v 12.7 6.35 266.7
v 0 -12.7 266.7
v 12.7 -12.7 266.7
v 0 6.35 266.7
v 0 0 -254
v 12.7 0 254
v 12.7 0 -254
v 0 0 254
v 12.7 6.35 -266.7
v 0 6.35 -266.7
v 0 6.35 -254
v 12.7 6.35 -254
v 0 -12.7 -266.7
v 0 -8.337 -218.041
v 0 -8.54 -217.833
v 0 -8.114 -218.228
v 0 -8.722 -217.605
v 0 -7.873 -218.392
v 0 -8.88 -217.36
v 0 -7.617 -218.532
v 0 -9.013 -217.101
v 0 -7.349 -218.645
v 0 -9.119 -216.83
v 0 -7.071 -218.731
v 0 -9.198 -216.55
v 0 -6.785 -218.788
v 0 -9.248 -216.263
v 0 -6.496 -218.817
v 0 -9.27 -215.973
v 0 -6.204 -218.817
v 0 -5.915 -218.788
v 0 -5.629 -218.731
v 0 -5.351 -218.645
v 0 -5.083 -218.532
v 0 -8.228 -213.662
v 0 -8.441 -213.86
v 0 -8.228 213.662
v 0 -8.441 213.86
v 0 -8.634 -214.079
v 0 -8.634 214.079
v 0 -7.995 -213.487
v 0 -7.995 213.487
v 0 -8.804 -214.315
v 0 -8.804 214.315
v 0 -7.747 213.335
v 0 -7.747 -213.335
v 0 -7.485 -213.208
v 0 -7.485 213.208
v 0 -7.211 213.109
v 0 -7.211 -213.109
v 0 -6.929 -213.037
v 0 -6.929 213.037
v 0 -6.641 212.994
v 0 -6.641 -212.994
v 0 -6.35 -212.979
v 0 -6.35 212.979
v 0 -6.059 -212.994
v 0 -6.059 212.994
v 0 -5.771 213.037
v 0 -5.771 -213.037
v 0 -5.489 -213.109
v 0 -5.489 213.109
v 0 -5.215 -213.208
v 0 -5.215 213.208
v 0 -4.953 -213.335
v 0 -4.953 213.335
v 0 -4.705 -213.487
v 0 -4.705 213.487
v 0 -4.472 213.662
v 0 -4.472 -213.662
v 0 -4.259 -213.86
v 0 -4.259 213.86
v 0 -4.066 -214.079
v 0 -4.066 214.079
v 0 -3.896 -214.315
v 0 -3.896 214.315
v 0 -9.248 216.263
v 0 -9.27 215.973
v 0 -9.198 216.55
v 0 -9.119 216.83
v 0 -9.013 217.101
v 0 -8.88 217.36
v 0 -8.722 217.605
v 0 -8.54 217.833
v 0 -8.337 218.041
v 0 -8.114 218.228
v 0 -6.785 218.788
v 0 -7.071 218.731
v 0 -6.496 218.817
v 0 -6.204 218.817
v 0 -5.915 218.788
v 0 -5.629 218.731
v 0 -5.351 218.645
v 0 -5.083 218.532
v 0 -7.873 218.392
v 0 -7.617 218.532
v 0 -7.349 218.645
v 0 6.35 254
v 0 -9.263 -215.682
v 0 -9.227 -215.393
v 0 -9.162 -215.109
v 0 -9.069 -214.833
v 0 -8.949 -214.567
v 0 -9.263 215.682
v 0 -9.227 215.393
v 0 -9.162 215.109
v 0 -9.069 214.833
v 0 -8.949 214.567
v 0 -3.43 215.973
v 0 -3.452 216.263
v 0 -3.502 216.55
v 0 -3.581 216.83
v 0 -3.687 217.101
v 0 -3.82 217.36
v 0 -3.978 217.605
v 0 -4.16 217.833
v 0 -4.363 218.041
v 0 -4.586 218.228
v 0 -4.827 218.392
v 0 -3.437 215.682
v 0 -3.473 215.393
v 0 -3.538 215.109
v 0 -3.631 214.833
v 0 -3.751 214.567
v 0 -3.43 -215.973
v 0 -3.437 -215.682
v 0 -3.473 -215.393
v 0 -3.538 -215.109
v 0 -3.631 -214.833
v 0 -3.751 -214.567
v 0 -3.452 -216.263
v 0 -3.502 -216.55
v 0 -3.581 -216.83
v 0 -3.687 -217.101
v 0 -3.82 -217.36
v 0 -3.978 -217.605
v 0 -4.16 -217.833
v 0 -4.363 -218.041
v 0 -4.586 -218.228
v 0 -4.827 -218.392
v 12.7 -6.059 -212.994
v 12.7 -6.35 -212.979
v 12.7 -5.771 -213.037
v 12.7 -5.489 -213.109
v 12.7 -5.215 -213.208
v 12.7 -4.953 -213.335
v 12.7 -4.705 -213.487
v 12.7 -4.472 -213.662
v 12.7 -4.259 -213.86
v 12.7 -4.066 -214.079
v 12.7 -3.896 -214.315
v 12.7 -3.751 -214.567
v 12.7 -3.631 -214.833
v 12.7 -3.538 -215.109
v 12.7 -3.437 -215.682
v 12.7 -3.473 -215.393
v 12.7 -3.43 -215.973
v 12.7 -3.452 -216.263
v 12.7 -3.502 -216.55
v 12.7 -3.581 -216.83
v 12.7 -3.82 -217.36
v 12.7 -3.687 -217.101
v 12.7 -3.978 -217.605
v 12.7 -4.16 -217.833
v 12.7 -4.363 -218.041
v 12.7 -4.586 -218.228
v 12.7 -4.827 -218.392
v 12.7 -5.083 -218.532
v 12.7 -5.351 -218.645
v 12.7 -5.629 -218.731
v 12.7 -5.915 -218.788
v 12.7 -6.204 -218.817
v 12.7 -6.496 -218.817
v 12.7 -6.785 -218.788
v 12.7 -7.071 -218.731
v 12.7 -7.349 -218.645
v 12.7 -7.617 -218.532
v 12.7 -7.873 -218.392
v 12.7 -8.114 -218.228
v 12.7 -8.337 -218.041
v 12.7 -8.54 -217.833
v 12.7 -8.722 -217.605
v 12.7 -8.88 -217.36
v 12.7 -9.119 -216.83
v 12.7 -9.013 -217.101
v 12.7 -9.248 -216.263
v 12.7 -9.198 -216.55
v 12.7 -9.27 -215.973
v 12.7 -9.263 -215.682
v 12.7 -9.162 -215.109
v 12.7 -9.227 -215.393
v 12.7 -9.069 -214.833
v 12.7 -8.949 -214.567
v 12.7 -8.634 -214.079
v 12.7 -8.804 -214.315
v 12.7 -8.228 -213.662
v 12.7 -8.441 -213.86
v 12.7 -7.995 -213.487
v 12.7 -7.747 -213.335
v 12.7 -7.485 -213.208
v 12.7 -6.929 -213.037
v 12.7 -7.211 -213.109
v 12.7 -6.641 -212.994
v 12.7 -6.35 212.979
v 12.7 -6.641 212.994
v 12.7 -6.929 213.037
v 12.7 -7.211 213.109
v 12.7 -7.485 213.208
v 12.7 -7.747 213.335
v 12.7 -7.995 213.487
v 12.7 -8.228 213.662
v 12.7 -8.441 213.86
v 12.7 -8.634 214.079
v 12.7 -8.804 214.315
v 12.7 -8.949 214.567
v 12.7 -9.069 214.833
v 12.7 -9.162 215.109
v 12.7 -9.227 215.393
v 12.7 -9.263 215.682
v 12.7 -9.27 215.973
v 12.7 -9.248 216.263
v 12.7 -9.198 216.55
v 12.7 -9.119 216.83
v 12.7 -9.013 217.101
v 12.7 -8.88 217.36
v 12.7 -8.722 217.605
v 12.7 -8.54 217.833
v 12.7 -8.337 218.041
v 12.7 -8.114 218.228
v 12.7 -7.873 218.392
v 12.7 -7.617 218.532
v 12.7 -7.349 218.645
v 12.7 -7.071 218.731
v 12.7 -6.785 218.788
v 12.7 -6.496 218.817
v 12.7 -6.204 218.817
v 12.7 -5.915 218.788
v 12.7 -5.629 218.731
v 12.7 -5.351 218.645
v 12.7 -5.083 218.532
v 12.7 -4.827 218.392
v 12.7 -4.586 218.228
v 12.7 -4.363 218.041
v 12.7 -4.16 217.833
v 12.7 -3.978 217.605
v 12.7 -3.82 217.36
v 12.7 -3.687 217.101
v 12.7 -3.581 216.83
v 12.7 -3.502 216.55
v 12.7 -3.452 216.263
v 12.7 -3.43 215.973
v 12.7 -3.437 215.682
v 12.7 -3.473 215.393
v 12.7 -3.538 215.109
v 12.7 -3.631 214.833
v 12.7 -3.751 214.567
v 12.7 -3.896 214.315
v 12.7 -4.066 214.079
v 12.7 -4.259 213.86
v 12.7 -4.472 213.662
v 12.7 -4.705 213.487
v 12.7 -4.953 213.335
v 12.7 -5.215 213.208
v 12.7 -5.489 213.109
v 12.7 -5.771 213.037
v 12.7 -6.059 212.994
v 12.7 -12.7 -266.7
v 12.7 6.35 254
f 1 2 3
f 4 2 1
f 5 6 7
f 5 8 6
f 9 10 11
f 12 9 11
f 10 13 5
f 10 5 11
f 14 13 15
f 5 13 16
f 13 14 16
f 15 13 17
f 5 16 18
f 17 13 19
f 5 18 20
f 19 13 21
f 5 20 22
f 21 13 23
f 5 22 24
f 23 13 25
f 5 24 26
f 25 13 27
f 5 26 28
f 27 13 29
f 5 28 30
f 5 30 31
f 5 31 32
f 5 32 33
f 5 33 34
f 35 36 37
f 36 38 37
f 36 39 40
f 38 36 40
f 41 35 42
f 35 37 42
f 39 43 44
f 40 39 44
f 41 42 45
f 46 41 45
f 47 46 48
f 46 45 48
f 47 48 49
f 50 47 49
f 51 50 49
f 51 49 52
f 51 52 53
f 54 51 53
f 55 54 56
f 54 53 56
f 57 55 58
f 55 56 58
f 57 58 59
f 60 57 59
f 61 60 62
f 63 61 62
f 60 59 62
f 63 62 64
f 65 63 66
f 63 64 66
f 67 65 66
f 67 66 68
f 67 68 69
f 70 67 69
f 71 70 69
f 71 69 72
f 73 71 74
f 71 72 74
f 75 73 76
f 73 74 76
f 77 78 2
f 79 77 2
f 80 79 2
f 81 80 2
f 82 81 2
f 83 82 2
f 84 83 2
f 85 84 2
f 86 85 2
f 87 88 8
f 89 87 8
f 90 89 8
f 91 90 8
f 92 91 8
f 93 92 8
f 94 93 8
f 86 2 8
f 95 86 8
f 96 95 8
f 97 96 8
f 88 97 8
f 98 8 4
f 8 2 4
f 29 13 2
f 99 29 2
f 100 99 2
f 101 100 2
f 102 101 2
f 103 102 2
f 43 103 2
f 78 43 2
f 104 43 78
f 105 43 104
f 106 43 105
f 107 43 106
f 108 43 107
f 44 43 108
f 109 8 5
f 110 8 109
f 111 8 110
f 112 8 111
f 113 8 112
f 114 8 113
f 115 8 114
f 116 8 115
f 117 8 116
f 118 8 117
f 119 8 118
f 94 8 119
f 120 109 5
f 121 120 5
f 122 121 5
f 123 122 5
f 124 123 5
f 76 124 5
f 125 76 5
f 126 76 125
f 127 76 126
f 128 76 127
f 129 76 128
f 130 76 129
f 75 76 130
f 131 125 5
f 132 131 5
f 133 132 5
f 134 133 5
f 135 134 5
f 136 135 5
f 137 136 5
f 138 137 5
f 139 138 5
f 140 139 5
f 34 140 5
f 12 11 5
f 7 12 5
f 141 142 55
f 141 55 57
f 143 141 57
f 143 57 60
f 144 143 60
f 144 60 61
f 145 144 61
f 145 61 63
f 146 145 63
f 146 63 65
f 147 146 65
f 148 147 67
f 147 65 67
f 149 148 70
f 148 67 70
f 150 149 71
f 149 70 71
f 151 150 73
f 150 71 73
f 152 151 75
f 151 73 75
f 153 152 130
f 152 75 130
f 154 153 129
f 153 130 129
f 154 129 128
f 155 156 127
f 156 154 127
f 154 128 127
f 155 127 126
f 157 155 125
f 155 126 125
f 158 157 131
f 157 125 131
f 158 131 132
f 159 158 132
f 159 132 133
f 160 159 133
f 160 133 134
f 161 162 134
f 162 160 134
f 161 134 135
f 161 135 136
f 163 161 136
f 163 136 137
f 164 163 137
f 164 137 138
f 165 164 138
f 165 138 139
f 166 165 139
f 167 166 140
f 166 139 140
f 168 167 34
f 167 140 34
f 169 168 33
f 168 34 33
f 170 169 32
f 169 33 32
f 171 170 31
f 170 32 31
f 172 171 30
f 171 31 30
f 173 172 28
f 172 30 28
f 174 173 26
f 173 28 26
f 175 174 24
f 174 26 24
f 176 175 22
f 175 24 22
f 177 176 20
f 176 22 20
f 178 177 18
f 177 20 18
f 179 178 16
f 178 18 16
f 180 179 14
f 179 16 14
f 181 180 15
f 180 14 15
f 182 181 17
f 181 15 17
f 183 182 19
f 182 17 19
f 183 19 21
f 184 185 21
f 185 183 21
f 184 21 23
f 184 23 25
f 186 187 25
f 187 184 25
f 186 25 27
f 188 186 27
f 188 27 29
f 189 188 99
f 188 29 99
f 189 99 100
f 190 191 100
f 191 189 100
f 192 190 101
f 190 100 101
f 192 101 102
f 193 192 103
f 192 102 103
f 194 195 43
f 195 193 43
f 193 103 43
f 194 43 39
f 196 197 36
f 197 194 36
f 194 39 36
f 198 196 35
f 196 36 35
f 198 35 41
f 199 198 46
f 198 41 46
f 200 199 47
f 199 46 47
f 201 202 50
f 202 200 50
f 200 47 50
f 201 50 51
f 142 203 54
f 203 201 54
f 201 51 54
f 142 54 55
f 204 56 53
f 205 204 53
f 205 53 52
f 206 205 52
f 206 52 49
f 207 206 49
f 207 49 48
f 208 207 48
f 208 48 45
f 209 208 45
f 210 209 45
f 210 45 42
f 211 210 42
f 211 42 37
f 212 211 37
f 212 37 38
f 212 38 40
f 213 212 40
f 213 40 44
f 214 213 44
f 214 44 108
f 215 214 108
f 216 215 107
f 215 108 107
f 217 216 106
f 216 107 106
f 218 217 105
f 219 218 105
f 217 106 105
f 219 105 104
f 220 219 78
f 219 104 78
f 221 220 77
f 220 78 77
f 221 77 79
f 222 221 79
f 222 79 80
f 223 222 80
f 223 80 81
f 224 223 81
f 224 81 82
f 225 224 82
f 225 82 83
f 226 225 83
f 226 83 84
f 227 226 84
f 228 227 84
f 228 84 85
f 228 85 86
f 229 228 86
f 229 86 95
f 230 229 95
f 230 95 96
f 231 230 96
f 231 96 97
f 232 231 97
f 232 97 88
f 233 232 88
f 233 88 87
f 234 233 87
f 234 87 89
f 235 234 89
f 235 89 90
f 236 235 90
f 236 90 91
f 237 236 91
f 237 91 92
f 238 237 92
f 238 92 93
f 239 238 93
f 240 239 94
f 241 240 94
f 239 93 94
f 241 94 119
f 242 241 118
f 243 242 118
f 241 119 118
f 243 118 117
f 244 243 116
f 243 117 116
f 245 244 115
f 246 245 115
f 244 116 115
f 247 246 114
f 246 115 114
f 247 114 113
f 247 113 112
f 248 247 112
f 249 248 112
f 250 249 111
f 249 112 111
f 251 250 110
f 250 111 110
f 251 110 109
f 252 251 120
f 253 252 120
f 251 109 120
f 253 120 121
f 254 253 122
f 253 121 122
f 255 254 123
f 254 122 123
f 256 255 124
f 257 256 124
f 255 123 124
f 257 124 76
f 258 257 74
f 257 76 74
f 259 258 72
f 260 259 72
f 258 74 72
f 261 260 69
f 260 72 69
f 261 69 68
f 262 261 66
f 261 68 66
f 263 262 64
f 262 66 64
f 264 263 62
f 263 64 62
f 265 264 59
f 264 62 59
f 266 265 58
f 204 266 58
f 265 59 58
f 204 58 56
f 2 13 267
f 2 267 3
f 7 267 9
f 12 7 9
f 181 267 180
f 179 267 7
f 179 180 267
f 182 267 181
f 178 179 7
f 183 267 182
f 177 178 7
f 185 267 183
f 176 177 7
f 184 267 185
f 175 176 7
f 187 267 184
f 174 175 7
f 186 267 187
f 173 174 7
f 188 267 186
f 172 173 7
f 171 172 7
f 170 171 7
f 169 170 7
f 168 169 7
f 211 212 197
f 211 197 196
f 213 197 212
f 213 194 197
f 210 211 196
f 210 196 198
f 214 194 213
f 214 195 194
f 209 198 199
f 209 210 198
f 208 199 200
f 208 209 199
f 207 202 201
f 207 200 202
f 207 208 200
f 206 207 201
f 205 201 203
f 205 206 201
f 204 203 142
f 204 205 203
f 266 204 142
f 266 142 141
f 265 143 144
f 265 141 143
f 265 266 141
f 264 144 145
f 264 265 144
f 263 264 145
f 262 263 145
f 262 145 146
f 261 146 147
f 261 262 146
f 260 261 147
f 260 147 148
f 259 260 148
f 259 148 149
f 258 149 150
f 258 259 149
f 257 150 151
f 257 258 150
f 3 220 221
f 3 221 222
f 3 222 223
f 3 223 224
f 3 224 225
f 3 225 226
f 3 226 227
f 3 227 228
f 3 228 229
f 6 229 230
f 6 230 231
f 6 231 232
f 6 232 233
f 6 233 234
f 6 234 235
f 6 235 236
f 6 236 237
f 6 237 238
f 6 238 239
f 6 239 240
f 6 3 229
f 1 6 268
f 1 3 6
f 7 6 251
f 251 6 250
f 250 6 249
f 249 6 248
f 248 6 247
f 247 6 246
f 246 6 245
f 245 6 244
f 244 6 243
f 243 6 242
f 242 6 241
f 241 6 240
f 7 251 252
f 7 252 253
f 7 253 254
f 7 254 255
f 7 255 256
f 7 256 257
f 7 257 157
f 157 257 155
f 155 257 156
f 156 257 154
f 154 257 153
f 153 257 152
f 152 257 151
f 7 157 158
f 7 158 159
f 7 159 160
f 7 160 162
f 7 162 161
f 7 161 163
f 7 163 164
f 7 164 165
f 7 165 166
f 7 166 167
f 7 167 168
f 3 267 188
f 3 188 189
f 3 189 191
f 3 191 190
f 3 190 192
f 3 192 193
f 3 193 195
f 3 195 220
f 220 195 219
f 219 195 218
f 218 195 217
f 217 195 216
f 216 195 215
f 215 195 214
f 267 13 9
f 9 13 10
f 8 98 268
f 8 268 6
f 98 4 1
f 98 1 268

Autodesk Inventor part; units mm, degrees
ref_plane "YZ Plane" through (0, 0, 0) normal (1, 0, 0) x (0, 1, 0)
ref_plane "XZ Plane" through (0, 0, 0) normal (0, 1, 0) x (-1, 0, 0)
ref_plane "XY Plane" through (0, 0, 0) normal (0, 0, 1) x (1, 0, 0)
sketch "Sketch1" plane through (0, 0, 0) normal (1, 0, 0) x (0, 1, 0)
  line L0 (3.3442, 266.7) -> (6.35, 266.7)
  line L1 (6.35, 266.7) -> (6.35, 254)
  line L2 (6.35, 254) -> (0, 254)
  line L3 (0, 254) -> (0, 0)
  line L4 (0, 0) -> (-12.7, 0) construction
  line L5 (-12.7, 0) -> (-12.7, 190.5)
  line L6 (-12.7, 215.9) -> (-12.7, 266.7)
  line L7 (3.3442, 266.7) -> (-12.7, 266.7)
  line L8 (3.3442, -266.7) -> (6.35, -266.7)
  line L9 (6.35, -266.7) -> (6.35, -254)
  line L10 (6.35, -254) -> (0, -254)
  line L11 (0, -254) -> (0, 0)
  line L12 (-12.7, 0) -> (-12.7, -190.5)
  line L13 (-12.7, -215.9) -> (-12.7, -266.7)
  line L14 (3.3442, -266.7) -> (-12.7, -266.7)
  line L15 (-12.7, 215.9) -> (-12.7, 190.5)
  line L16 (-12.7, -190.5) -> (-12.7, -215.9)
  dimension "d1" = 12.7
  dimension "d3" = 6.35
  dimension "d4" = 254
  dimension "d5" = 12.7
extrude "Extrusion1" add sketch "Sketch1" along normal blind 12.7
sketch "Sketch4" plane through (12.7, 0, 0) normal (1, 0, 0) x (0, 0, -1)
  circle A0 centre (-215.9, -6.35) radius 2.921
  line L0 (-266.7, 6.35) -> (-266.7, -12.7) projected
  line L1 (254, 0) -> (-254, 0) projected
  point P0 (0, 0)
  dimension "d32" = 5.842
  dimension "d33" = 50.8
  dimension "d34" = 6.35
hole "Hole3" at (12.7, -6.35, 215.9) direction (-1, 0, 0) diameter 5.842 end through all
mirror "Mirror3" about plane through (0, 0, 0) normal (0, 0, 1) of "Hole3"
properties part number "Support GuideRail"
